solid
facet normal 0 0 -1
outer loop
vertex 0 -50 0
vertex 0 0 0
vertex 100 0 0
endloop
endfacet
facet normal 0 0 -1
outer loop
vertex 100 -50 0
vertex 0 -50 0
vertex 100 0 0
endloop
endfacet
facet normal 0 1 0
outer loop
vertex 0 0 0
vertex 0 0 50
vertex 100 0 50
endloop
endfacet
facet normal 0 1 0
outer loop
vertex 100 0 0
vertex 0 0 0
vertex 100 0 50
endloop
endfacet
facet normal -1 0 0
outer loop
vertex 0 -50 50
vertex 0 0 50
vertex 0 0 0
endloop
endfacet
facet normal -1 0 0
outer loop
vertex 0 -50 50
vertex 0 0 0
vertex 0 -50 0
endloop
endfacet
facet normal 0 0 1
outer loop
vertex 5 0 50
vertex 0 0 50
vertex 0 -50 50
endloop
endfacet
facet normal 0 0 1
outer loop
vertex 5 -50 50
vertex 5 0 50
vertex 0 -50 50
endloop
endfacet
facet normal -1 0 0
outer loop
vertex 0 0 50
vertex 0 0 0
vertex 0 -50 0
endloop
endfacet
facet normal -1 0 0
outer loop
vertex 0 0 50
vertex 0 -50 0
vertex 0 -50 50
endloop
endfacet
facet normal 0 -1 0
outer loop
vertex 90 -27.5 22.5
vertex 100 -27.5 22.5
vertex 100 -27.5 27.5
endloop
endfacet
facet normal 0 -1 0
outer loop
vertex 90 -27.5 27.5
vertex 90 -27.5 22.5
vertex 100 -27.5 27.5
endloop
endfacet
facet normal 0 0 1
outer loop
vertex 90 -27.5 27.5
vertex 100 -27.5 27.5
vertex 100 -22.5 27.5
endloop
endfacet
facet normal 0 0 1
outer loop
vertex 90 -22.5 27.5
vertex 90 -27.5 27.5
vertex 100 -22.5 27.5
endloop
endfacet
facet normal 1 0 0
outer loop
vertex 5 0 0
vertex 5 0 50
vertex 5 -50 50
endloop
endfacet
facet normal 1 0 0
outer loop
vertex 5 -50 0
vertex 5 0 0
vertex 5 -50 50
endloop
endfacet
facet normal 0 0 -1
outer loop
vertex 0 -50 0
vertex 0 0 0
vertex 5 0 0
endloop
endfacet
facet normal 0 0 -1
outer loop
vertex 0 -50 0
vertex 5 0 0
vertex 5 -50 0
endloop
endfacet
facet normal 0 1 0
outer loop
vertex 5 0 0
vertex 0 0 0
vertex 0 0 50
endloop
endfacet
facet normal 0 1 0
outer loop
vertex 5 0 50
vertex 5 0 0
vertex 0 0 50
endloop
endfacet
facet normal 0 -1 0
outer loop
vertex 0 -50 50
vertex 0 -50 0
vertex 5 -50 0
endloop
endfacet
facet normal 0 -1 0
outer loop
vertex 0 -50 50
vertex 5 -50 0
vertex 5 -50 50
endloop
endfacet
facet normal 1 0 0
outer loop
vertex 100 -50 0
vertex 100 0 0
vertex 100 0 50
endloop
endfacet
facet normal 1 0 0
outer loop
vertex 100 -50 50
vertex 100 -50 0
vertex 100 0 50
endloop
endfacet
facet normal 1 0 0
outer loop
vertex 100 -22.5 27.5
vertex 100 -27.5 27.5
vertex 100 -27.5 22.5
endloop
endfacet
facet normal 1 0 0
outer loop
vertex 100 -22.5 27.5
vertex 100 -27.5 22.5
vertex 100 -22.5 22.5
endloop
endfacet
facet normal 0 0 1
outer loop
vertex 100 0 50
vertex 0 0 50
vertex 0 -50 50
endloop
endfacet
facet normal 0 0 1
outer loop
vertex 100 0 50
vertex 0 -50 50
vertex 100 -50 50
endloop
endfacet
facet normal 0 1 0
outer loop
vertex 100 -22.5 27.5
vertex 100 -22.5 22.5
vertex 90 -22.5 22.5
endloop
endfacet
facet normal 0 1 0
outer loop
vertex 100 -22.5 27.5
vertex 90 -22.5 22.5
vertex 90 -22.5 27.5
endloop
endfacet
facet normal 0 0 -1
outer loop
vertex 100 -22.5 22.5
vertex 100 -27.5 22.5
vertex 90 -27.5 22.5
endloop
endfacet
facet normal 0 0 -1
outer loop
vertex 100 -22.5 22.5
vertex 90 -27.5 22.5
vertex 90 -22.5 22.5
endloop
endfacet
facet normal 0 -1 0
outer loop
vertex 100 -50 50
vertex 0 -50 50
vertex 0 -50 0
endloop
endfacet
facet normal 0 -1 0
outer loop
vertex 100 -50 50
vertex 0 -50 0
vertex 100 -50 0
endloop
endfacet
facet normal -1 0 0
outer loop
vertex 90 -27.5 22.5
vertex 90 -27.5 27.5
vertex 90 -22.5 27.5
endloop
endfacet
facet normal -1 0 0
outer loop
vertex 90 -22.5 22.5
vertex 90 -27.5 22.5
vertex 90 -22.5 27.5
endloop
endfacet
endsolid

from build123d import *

# Parameters (mm, degrees)
F0_W      = 100
F0_H      = 50
F1_DEPTH  = 50
F1_FACE_W = 50
F1_FACE_H = 50
F3_DEPTH  = 5
F4_W      = 5
F4_H      = 5
F5_DEPTH  = 10


with BuildPart() as f1:
    # F0 (on Front) → F1 (new body)
    with BuildSketch(Plane.XZ):
        with Locations((50, 25)):
            Rectangle(F0_W, F0_H)
    extrude(amount=F1_DEPTH)


with BuildPart() as f3:
    # F1_face (on face) → F3 (new body)
    with BuildSketch(Plane(origin=(0, -25, 25), x_dir=(0, -1, 0), z_dir=(-1, 0, 0))):
        Rectangle(F1_FACE_W, F1_FACE_H)
    extrude(amount=-F3_DEPTH)


with BuildPart() as f5:
    # F4 (on face) → F5 (new body)
    with BuildSketch(Plane.YZ.offset(100)):
        with Locations((-25, 25)):
            Rectangle(F4_W, F4_H)
    extrude(amount=-F5_DEPTH)


solid = Compound([f1.part, f3.part, f5.part])
